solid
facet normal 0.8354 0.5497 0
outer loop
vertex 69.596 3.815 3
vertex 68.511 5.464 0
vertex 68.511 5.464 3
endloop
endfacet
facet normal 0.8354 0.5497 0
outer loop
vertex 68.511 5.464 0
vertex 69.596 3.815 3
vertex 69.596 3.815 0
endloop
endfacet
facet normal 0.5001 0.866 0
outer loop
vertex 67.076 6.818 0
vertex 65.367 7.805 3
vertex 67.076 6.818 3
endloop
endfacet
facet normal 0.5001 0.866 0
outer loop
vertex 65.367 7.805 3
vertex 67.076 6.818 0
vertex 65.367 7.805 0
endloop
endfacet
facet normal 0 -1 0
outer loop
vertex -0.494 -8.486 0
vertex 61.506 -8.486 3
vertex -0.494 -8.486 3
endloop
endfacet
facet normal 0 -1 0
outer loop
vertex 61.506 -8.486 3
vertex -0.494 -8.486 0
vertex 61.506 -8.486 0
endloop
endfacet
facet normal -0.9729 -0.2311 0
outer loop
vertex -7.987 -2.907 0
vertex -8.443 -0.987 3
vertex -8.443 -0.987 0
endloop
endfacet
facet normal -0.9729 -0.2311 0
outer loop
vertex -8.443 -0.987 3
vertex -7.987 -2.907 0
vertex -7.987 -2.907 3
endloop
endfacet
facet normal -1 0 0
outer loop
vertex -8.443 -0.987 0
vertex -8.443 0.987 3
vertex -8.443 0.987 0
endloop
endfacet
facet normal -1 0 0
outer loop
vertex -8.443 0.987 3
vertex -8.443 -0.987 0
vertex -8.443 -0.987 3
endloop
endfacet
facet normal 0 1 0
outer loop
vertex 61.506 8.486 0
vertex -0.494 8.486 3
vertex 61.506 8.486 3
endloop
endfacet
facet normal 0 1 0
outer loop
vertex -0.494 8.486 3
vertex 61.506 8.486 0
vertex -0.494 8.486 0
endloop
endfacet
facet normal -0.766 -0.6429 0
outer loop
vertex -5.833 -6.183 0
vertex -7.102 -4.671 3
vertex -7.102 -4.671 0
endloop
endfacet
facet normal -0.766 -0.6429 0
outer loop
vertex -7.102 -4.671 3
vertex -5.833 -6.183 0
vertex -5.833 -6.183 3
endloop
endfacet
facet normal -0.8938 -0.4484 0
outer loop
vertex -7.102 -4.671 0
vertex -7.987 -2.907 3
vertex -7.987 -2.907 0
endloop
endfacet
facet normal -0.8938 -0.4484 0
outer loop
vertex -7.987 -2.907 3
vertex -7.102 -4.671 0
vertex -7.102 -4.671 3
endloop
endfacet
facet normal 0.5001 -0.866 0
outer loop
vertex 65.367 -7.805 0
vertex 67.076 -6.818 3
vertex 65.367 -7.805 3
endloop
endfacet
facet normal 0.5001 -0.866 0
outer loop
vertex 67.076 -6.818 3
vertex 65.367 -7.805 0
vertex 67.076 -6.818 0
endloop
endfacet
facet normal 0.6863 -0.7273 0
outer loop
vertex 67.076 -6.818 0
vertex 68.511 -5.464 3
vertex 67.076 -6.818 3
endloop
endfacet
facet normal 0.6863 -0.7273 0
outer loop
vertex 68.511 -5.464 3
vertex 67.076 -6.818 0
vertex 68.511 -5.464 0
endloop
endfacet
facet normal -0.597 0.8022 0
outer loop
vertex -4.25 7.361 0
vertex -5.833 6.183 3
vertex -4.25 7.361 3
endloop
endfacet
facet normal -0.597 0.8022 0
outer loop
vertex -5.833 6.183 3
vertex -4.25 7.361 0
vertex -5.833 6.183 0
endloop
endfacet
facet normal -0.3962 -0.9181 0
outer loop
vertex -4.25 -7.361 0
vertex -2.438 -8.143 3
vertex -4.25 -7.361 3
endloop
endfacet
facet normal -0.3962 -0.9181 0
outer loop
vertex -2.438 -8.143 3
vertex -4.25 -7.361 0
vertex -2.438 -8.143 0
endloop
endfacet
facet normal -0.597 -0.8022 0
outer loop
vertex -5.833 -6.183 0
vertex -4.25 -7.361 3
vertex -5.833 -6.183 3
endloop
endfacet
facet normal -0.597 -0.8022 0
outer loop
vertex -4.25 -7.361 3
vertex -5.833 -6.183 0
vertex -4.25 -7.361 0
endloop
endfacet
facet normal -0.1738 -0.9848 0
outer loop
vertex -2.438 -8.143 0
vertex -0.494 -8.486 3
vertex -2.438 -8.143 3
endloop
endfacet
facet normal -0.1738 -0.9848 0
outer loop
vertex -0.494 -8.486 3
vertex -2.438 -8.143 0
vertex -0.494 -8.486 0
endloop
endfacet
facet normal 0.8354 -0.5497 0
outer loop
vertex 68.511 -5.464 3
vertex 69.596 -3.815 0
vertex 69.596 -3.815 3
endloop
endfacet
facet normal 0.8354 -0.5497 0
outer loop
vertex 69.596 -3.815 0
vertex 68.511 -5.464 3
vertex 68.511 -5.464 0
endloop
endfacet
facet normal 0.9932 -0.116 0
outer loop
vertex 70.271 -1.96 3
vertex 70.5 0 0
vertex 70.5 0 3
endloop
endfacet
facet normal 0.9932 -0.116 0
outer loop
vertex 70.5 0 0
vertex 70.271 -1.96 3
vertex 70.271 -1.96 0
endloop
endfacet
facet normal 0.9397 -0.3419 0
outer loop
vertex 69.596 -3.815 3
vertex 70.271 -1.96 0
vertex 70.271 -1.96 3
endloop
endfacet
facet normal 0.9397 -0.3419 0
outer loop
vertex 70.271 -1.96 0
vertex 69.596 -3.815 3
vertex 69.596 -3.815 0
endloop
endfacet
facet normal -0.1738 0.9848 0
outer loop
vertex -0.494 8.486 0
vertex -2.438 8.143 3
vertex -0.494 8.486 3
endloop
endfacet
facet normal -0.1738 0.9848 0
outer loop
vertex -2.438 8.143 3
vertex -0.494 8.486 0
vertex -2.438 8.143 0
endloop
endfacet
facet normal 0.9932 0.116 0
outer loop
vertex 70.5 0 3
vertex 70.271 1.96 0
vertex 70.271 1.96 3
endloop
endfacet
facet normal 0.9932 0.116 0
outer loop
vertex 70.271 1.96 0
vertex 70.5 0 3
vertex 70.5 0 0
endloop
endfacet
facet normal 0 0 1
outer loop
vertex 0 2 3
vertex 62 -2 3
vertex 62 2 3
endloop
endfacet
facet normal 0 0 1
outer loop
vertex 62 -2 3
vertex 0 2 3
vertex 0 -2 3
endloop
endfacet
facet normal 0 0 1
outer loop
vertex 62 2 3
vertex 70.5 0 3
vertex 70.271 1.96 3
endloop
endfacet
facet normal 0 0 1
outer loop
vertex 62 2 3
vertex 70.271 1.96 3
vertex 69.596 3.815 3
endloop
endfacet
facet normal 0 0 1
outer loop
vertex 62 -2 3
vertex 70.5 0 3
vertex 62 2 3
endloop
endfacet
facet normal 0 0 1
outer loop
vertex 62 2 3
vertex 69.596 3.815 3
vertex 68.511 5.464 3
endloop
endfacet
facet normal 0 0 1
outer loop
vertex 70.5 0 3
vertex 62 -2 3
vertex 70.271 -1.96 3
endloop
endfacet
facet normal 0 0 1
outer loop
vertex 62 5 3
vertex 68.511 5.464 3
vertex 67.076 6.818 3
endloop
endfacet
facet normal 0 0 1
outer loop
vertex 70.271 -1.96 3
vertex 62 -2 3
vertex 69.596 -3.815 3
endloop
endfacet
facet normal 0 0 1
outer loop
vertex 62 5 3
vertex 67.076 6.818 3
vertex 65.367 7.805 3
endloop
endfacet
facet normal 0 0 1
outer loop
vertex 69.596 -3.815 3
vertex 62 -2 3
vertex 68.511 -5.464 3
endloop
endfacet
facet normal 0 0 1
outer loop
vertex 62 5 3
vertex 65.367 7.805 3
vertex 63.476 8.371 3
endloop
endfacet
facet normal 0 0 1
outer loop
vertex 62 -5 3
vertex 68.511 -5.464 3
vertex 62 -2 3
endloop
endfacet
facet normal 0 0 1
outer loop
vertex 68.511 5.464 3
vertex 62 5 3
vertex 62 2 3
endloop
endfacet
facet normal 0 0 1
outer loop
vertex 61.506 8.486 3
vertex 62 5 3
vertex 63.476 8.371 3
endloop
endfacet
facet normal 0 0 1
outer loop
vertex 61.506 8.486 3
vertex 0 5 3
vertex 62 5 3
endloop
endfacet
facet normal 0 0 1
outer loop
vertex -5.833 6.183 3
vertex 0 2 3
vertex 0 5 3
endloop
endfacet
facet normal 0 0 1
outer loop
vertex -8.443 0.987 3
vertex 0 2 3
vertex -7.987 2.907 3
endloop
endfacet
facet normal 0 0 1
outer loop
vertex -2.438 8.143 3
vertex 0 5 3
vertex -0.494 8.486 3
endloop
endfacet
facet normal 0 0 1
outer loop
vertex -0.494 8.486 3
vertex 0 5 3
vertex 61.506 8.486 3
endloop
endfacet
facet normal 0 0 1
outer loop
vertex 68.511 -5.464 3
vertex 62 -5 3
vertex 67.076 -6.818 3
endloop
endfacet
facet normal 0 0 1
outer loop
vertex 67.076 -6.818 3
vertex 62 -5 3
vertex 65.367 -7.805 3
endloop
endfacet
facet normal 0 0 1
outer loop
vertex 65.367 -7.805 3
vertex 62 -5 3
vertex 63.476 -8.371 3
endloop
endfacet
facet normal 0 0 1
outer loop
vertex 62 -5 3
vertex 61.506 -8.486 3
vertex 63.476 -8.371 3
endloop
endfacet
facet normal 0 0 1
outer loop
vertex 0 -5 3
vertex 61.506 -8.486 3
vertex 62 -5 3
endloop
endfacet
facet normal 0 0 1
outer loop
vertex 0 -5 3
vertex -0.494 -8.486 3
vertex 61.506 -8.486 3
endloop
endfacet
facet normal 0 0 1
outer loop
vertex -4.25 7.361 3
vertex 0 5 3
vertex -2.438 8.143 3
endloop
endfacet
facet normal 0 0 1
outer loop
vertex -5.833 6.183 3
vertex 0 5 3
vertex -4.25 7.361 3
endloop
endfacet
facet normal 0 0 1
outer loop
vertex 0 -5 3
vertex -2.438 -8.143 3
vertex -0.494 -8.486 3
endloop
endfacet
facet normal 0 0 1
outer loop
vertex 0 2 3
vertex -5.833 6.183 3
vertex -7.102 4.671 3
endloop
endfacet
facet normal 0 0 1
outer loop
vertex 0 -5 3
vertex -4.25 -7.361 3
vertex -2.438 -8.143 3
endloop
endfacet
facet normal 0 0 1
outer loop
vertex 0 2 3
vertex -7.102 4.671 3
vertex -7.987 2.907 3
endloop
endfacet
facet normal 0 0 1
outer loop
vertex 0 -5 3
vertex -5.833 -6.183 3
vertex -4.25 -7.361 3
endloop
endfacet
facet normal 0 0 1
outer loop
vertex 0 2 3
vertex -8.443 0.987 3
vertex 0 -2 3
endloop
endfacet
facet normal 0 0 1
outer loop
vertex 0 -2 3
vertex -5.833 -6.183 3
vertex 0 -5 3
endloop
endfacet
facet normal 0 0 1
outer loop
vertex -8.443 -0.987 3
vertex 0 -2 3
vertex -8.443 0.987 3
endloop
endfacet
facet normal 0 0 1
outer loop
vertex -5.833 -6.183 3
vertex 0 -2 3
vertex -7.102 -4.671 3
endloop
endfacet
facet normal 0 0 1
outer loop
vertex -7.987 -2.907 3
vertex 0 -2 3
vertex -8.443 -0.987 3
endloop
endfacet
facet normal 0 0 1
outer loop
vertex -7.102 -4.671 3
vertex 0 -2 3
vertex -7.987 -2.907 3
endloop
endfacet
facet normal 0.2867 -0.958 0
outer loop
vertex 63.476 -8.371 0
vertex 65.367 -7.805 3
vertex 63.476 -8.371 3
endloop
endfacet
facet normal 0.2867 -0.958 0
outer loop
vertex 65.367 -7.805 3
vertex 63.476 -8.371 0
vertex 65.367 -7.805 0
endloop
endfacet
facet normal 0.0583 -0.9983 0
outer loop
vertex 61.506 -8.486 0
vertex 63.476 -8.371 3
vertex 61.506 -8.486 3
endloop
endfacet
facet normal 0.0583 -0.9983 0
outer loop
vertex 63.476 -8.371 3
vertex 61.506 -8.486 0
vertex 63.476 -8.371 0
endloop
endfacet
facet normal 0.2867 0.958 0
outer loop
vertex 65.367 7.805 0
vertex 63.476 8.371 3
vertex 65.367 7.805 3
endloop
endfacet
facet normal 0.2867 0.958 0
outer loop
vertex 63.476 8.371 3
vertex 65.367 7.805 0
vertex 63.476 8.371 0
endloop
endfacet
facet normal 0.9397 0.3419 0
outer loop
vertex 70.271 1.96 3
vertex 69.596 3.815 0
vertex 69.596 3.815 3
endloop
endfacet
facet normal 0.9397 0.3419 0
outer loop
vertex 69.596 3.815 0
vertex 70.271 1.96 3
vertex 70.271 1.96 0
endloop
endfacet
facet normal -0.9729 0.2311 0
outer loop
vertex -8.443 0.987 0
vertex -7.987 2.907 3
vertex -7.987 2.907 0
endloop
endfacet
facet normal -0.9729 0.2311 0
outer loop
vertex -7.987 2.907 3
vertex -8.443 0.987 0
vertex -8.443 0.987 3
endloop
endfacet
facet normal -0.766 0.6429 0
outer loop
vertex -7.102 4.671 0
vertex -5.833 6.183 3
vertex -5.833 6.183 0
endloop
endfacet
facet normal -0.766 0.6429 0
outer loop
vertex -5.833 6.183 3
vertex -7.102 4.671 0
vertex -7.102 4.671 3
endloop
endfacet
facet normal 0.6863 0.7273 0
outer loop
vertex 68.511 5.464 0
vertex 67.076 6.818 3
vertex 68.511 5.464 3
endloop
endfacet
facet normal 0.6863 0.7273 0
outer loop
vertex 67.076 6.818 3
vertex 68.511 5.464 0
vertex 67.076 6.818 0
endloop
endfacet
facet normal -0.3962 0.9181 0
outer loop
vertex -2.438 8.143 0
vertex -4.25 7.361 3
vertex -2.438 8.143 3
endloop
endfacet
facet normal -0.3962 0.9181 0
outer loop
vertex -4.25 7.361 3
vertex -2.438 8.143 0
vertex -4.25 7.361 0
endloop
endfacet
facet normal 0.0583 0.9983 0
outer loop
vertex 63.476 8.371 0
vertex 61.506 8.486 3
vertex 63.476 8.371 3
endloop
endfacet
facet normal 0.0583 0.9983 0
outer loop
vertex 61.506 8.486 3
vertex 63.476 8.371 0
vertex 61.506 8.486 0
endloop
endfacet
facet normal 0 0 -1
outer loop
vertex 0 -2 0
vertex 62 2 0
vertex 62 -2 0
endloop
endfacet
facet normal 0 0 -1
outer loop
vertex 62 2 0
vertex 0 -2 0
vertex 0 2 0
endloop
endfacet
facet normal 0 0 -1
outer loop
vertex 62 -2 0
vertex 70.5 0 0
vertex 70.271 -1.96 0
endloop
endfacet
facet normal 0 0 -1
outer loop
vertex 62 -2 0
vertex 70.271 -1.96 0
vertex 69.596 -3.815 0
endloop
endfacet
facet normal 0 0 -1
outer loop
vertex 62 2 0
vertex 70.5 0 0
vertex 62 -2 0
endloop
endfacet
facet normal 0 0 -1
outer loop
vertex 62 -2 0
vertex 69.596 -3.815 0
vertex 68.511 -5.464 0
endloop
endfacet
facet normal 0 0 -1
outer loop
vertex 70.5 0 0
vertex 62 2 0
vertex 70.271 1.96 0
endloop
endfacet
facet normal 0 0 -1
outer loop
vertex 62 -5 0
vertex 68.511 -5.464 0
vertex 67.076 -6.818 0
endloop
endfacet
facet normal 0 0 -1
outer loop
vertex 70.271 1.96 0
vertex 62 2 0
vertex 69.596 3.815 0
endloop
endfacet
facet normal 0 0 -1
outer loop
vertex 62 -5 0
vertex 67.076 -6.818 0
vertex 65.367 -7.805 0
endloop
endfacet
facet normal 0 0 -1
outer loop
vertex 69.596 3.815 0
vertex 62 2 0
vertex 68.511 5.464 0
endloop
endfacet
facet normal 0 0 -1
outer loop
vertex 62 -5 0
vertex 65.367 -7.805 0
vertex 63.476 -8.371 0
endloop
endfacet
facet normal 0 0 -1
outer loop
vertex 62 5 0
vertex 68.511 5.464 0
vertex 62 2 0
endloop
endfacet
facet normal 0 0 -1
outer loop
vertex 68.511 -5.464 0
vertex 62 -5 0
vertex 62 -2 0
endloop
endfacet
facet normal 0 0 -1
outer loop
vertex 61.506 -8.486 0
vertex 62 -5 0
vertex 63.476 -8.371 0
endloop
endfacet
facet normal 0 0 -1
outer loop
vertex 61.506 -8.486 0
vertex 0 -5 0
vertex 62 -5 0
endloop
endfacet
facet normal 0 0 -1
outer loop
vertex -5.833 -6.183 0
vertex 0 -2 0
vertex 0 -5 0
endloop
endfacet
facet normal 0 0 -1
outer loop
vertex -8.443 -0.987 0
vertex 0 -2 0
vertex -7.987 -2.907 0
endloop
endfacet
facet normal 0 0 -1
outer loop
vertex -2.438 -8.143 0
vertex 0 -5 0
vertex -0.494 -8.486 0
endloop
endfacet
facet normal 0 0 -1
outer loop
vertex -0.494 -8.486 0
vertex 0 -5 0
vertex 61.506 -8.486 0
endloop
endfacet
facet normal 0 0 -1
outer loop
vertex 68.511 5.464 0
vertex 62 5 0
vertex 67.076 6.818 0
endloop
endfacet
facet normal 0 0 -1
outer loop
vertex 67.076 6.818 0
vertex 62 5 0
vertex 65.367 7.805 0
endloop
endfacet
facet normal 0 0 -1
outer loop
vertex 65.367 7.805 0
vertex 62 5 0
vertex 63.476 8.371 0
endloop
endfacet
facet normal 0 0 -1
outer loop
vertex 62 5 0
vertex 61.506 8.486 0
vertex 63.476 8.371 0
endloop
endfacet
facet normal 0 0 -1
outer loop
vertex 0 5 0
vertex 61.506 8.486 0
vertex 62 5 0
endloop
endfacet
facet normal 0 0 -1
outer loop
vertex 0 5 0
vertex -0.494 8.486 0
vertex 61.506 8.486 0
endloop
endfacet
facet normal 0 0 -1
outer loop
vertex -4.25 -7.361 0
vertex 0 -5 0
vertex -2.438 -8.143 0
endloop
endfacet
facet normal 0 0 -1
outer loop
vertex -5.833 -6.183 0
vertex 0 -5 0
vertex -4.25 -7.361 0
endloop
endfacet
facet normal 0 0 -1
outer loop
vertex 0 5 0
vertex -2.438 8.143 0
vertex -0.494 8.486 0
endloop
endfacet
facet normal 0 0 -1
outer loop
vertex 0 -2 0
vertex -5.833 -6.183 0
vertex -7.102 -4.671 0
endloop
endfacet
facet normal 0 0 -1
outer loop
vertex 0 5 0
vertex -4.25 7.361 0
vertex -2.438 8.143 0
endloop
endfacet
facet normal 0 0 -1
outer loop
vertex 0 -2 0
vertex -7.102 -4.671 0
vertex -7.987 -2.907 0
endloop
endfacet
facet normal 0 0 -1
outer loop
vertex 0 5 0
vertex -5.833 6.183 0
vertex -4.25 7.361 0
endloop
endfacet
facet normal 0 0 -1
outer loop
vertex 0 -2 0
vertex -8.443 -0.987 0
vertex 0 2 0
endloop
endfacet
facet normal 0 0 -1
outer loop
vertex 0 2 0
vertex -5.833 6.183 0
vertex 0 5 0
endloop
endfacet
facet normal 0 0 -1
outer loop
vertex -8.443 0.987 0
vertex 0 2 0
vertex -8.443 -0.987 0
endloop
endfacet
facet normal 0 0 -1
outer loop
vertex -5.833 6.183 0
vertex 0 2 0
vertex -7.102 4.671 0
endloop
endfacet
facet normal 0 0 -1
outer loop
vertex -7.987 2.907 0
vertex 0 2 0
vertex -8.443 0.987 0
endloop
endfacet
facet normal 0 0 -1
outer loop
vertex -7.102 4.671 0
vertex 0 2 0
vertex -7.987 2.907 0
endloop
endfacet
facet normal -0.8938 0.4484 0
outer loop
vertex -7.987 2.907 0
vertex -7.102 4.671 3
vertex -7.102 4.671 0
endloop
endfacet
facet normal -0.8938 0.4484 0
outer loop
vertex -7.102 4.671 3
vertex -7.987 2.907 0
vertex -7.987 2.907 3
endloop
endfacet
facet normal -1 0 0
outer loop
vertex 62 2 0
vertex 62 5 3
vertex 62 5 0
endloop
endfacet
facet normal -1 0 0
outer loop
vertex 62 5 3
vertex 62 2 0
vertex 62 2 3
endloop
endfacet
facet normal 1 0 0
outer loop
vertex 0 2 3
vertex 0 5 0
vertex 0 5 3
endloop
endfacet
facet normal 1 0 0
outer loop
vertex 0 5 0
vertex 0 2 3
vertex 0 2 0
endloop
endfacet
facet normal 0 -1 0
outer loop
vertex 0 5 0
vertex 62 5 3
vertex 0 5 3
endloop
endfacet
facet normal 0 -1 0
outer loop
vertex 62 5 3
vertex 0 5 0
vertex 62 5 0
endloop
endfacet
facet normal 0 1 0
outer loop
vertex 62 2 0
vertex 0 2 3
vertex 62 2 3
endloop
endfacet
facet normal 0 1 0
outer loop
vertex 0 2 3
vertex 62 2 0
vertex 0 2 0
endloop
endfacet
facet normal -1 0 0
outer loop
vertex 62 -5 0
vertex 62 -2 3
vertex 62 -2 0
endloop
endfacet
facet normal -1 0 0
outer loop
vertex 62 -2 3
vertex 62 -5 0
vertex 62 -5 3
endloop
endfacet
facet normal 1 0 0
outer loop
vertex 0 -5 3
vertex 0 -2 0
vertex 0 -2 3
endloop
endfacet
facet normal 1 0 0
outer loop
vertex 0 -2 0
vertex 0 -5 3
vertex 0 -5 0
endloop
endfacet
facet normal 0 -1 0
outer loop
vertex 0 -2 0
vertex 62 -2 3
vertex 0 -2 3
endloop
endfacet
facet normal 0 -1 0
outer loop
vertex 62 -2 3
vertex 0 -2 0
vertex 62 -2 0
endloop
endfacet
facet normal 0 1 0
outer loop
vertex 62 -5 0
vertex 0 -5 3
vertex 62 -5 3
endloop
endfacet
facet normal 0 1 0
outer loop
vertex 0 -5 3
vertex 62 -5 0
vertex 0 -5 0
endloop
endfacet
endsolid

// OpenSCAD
difference() {
    hull() {
        cylinder(h=3,d=17);
        translate([62,0,0]) cylinder(h=3,d=17);
    }
    translate([0,2,-.5]) cube([62,3,4]);
    translate([0,-5,-.5]) cube([62,3,4]);
}
